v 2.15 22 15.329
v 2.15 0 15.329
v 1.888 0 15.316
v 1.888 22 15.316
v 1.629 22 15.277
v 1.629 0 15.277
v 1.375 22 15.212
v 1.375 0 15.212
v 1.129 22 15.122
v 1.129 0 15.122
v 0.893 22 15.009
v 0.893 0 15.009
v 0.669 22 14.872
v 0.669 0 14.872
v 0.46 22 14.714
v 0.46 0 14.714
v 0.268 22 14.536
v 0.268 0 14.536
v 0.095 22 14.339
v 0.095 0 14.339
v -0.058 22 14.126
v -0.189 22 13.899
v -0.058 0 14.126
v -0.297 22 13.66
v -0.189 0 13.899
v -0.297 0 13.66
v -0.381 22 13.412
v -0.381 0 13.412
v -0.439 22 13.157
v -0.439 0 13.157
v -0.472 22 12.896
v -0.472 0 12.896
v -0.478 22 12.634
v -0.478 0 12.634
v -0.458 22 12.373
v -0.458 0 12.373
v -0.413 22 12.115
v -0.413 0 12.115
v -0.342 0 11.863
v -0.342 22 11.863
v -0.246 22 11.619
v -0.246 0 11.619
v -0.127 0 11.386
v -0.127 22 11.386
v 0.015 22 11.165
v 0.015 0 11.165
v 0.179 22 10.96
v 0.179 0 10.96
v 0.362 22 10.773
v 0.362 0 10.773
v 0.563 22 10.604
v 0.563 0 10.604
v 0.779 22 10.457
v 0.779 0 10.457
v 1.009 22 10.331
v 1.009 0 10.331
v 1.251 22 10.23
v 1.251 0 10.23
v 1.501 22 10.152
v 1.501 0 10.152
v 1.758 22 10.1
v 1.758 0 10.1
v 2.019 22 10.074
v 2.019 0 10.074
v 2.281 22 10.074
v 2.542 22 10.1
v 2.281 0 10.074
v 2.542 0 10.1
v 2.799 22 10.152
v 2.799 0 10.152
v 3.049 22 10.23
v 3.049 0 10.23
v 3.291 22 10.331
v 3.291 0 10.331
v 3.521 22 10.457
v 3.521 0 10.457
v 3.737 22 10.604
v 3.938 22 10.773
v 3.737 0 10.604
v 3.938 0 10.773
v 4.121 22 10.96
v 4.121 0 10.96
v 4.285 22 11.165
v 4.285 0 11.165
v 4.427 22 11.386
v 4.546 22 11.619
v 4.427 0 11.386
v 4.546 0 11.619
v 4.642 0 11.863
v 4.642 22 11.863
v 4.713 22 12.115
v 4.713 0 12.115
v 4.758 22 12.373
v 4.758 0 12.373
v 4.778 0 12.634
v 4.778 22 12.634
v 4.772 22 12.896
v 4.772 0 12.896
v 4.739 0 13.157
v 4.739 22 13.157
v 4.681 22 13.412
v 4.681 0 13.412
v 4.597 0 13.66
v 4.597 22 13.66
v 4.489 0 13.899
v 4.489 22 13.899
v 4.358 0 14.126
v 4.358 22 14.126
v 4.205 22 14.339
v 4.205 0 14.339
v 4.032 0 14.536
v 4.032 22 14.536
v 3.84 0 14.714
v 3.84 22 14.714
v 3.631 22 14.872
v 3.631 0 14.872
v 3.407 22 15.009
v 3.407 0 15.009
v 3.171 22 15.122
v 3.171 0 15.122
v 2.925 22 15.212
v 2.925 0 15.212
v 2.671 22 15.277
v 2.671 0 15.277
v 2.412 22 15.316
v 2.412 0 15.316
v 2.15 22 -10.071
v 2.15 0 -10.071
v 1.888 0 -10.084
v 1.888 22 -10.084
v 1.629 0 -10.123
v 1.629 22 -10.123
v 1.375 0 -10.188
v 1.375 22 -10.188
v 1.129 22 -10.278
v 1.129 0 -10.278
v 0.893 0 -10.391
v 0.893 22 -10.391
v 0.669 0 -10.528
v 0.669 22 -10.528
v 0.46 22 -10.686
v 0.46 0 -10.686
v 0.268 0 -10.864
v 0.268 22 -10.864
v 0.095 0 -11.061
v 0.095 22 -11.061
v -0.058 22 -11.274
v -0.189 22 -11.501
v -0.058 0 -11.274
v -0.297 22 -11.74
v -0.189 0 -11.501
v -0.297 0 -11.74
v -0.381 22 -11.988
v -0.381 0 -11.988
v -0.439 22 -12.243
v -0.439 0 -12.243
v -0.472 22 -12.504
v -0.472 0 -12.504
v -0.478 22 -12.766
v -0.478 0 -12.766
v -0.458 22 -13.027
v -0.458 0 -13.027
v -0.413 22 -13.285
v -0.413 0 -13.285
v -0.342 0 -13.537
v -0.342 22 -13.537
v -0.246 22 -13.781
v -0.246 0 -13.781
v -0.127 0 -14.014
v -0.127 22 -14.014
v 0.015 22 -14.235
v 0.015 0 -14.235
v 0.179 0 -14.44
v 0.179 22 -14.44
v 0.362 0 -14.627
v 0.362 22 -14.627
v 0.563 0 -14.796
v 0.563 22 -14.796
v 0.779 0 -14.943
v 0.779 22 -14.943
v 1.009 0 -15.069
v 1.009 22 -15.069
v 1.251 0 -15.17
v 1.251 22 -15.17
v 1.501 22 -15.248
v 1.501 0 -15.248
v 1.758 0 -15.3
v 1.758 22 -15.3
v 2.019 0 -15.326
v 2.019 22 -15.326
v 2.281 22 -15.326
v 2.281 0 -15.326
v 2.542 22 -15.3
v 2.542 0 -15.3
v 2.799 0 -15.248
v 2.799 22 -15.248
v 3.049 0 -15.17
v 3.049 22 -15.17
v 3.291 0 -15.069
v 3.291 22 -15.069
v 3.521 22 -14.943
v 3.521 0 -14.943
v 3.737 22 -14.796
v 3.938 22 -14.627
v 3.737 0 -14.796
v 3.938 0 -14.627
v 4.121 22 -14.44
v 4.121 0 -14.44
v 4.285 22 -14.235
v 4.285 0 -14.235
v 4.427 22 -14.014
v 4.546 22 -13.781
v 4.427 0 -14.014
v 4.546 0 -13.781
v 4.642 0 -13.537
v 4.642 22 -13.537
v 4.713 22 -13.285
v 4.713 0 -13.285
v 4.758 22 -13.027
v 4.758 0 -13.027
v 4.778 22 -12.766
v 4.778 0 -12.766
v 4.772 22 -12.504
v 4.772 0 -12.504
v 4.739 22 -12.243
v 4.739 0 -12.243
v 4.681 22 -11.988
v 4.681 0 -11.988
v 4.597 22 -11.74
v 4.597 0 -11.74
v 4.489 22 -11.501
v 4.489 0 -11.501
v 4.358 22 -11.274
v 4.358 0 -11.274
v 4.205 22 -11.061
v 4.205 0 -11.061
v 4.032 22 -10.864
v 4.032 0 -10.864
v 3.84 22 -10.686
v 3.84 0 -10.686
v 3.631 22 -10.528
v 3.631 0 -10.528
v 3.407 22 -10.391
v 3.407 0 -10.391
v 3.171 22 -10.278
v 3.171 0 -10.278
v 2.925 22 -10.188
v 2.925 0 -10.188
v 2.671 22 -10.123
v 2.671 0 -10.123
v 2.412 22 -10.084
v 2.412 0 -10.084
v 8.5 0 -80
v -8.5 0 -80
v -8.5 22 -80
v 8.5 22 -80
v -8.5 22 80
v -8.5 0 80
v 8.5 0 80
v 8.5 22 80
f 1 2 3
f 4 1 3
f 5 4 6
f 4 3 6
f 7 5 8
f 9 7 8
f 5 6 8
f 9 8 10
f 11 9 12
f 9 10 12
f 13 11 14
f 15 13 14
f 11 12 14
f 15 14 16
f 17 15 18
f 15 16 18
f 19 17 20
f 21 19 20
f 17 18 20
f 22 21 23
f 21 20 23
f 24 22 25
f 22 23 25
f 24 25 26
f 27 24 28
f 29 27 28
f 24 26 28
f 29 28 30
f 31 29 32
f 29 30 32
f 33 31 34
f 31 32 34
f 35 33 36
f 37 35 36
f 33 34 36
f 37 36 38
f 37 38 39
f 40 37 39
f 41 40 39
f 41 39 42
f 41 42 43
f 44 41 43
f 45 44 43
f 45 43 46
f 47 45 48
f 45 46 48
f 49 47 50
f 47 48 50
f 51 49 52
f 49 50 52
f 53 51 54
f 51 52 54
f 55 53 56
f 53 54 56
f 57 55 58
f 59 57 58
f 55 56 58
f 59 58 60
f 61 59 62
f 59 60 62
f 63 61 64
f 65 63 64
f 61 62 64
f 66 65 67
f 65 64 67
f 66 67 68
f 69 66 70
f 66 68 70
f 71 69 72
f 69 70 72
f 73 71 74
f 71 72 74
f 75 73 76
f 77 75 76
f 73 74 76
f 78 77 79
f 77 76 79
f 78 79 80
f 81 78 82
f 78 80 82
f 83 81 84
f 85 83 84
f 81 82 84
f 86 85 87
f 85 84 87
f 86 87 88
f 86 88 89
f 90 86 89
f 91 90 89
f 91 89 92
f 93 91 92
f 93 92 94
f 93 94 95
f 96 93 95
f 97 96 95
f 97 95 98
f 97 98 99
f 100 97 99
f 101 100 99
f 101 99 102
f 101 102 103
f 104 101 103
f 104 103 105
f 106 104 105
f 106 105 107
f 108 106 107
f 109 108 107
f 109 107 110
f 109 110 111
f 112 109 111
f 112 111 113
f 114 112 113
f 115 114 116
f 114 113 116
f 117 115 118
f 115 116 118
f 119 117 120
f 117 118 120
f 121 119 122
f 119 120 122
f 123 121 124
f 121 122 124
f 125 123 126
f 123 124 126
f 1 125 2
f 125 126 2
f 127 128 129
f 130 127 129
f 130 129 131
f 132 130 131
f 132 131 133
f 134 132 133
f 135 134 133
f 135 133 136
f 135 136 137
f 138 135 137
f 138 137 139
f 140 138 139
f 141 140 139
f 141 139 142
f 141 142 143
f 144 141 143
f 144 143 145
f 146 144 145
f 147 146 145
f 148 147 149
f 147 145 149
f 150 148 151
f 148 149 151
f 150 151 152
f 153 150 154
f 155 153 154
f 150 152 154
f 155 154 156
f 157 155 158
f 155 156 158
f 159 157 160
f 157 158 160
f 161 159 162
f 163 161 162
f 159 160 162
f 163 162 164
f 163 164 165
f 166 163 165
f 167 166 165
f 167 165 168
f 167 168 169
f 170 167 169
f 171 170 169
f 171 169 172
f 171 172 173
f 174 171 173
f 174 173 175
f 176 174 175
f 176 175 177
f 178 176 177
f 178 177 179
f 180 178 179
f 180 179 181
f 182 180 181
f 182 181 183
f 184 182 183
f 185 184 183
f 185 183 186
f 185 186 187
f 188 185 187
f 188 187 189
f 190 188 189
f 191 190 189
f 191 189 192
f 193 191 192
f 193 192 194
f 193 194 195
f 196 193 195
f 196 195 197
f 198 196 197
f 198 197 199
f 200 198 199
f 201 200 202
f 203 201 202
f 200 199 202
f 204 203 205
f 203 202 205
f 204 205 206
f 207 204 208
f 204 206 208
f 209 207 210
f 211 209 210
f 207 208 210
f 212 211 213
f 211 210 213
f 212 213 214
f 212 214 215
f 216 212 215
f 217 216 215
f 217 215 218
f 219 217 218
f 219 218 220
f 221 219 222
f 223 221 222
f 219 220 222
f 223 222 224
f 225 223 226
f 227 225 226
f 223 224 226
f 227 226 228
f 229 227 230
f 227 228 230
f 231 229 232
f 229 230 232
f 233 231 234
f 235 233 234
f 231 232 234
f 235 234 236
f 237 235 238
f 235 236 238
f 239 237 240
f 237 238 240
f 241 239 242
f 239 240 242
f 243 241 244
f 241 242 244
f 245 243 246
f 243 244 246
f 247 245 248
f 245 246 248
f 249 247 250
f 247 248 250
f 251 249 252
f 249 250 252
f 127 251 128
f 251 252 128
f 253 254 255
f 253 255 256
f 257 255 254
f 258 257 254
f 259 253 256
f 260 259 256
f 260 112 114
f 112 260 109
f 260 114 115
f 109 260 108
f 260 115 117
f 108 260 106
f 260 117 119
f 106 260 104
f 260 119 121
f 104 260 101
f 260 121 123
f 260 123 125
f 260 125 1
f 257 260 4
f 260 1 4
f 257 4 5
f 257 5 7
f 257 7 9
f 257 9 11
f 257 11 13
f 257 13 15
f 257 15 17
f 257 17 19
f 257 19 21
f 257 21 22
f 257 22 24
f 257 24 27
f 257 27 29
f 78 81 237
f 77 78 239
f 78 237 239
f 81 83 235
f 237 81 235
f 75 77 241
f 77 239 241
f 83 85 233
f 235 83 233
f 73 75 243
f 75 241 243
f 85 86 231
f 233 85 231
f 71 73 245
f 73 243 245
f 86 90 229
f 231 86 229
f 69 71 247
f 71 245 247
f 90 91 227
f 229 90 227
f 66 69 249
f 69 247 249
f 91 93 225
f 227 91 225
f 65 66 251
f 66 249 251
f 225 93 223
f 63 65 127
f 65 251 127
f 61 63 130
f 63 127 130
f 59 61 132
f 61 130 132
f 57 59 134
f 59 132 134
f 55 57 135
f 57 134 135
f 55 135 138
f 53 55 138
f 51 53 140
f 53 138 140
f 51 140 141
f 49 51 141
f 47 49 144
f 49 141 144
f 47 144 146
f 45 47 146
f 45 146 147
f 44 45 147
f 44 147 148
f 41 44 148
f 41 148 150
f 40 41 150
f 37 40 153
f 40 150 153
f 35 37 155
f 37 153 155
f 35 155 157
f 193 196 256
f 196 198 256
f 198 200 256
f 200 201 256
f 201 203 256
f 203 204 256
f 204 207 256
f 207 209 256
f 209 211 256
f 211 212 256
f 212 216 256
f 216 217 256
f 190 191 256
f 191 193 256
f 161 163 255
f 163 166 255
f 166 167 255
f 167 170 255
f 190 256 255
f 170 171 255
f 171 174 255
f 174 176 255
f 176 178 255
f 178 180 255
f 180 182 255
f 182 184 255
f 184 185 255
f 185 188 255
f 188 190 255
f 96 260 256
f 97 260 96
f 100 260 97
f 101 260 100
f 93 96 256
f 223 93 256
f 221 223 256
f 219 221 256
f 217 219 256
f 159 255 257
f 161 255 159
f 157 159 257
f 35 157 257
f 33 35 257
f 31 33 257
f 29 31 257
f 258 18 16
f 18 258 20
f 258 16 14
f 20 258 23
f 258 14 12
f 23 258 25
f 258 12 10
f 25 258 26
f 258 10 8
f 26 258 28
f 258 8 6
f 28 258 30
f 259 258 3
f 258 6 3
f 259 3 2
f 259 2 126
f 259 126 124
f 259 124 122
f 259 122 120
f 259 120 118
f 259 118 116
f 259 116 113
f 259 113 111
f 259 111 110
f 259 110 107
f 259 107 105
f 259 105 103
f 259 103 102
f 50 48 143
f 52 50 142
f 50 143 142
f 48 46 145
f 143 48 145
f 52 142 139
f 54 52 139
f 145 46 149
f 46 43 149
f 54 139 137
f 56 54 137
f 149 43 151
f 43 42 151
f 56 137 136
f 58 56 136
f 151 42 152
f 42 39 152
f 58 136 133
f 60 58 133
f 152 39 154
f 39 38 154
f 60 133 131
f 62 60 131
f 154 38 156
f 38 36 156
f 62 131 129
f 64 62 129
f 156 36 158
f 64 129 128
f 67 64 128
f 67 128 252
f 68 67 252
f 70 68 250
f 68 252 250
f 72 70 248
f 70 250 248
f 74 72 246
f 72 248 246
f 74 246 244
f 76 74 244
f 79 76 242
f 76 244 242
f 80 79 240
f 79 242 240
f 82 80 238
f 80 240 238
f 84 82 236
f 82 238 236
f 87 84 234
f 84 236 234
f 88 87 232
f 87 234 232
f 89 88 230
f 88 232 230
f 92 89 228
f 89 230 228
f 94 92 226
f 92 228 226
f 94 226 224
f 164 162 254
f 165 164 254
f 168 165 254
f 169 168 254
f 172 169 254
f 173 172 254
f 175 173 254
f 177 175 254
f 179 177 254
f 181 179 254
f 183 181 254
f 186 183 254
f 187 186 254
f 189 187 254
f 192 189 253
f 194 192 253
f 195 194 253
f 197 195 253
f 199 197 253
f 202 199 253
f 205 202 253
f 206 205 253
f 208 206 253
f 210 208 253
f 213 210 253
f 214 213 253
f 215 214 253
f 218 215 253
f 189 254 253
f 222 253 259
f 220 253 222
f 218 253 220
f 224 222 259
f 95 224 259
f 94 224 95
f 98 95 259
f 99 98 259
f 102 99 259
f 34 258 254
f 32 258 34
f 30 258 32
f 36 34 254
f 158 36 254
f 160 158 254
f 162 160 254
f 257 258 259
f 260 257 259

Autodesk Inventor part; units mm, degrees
ref_plane "YZ Plane" through (0, 0, 0) normal (1, 0, 0) x (0, 1, 0)
ref_plane "XZ Plane" through (0, 0, 0) normal (0, 1, 0) x (-1, 0, 0)
ref_plane "XY Plane" through (0, 0, 0) normal (0, 0, 1) x (1, 0, 0)
sketch "Sketch1" plane through (0, 0, 0) normal (0, 0, 1) x (1, 0, 0)
  line L0 (-8.5, 0) -> (8.5, 0)
  line L1 (8.5, 0) -> (8.5, 22)
  line L2 (8.5, 22) -> (-8.5, 22)
  line L3 (-8.5, 22) -> (-8.5, 0)
  point P0 (0, 0)
  point P1 (0, 0)
  dimension "d0" = 22
  dimension "d1" = 17
extrude "Extrusion1" add sketch "Sketch1" along normal mid plane 160
sketch "Sketch2" plane through (-8.5, 22, -80) normal (0, 1, 0) x (1, 0, 0)
  line L0 (17, 0) -> (17, -160) projected
  line L1 (10.65, -92.7) -> (10.65, -80)
  point P0 (17, -80)
  dimension "d4" = 6.35
  dimension "d16" = 12.7
hole "Hole1" at (2.15, 22, 12.7) direction (0, -1, 0) diameter 5.2578 end through all thread size "1/4-20 UNC" class "2B" standard "ANSI Unified Screw Threads"
pattern_linear "Rectangular Pattern1" count 2 spacing 25.4 along (0, 0, -1) of "Hole1"
properties part number "PWTR-0041" material "Stainless Steel, 303"
